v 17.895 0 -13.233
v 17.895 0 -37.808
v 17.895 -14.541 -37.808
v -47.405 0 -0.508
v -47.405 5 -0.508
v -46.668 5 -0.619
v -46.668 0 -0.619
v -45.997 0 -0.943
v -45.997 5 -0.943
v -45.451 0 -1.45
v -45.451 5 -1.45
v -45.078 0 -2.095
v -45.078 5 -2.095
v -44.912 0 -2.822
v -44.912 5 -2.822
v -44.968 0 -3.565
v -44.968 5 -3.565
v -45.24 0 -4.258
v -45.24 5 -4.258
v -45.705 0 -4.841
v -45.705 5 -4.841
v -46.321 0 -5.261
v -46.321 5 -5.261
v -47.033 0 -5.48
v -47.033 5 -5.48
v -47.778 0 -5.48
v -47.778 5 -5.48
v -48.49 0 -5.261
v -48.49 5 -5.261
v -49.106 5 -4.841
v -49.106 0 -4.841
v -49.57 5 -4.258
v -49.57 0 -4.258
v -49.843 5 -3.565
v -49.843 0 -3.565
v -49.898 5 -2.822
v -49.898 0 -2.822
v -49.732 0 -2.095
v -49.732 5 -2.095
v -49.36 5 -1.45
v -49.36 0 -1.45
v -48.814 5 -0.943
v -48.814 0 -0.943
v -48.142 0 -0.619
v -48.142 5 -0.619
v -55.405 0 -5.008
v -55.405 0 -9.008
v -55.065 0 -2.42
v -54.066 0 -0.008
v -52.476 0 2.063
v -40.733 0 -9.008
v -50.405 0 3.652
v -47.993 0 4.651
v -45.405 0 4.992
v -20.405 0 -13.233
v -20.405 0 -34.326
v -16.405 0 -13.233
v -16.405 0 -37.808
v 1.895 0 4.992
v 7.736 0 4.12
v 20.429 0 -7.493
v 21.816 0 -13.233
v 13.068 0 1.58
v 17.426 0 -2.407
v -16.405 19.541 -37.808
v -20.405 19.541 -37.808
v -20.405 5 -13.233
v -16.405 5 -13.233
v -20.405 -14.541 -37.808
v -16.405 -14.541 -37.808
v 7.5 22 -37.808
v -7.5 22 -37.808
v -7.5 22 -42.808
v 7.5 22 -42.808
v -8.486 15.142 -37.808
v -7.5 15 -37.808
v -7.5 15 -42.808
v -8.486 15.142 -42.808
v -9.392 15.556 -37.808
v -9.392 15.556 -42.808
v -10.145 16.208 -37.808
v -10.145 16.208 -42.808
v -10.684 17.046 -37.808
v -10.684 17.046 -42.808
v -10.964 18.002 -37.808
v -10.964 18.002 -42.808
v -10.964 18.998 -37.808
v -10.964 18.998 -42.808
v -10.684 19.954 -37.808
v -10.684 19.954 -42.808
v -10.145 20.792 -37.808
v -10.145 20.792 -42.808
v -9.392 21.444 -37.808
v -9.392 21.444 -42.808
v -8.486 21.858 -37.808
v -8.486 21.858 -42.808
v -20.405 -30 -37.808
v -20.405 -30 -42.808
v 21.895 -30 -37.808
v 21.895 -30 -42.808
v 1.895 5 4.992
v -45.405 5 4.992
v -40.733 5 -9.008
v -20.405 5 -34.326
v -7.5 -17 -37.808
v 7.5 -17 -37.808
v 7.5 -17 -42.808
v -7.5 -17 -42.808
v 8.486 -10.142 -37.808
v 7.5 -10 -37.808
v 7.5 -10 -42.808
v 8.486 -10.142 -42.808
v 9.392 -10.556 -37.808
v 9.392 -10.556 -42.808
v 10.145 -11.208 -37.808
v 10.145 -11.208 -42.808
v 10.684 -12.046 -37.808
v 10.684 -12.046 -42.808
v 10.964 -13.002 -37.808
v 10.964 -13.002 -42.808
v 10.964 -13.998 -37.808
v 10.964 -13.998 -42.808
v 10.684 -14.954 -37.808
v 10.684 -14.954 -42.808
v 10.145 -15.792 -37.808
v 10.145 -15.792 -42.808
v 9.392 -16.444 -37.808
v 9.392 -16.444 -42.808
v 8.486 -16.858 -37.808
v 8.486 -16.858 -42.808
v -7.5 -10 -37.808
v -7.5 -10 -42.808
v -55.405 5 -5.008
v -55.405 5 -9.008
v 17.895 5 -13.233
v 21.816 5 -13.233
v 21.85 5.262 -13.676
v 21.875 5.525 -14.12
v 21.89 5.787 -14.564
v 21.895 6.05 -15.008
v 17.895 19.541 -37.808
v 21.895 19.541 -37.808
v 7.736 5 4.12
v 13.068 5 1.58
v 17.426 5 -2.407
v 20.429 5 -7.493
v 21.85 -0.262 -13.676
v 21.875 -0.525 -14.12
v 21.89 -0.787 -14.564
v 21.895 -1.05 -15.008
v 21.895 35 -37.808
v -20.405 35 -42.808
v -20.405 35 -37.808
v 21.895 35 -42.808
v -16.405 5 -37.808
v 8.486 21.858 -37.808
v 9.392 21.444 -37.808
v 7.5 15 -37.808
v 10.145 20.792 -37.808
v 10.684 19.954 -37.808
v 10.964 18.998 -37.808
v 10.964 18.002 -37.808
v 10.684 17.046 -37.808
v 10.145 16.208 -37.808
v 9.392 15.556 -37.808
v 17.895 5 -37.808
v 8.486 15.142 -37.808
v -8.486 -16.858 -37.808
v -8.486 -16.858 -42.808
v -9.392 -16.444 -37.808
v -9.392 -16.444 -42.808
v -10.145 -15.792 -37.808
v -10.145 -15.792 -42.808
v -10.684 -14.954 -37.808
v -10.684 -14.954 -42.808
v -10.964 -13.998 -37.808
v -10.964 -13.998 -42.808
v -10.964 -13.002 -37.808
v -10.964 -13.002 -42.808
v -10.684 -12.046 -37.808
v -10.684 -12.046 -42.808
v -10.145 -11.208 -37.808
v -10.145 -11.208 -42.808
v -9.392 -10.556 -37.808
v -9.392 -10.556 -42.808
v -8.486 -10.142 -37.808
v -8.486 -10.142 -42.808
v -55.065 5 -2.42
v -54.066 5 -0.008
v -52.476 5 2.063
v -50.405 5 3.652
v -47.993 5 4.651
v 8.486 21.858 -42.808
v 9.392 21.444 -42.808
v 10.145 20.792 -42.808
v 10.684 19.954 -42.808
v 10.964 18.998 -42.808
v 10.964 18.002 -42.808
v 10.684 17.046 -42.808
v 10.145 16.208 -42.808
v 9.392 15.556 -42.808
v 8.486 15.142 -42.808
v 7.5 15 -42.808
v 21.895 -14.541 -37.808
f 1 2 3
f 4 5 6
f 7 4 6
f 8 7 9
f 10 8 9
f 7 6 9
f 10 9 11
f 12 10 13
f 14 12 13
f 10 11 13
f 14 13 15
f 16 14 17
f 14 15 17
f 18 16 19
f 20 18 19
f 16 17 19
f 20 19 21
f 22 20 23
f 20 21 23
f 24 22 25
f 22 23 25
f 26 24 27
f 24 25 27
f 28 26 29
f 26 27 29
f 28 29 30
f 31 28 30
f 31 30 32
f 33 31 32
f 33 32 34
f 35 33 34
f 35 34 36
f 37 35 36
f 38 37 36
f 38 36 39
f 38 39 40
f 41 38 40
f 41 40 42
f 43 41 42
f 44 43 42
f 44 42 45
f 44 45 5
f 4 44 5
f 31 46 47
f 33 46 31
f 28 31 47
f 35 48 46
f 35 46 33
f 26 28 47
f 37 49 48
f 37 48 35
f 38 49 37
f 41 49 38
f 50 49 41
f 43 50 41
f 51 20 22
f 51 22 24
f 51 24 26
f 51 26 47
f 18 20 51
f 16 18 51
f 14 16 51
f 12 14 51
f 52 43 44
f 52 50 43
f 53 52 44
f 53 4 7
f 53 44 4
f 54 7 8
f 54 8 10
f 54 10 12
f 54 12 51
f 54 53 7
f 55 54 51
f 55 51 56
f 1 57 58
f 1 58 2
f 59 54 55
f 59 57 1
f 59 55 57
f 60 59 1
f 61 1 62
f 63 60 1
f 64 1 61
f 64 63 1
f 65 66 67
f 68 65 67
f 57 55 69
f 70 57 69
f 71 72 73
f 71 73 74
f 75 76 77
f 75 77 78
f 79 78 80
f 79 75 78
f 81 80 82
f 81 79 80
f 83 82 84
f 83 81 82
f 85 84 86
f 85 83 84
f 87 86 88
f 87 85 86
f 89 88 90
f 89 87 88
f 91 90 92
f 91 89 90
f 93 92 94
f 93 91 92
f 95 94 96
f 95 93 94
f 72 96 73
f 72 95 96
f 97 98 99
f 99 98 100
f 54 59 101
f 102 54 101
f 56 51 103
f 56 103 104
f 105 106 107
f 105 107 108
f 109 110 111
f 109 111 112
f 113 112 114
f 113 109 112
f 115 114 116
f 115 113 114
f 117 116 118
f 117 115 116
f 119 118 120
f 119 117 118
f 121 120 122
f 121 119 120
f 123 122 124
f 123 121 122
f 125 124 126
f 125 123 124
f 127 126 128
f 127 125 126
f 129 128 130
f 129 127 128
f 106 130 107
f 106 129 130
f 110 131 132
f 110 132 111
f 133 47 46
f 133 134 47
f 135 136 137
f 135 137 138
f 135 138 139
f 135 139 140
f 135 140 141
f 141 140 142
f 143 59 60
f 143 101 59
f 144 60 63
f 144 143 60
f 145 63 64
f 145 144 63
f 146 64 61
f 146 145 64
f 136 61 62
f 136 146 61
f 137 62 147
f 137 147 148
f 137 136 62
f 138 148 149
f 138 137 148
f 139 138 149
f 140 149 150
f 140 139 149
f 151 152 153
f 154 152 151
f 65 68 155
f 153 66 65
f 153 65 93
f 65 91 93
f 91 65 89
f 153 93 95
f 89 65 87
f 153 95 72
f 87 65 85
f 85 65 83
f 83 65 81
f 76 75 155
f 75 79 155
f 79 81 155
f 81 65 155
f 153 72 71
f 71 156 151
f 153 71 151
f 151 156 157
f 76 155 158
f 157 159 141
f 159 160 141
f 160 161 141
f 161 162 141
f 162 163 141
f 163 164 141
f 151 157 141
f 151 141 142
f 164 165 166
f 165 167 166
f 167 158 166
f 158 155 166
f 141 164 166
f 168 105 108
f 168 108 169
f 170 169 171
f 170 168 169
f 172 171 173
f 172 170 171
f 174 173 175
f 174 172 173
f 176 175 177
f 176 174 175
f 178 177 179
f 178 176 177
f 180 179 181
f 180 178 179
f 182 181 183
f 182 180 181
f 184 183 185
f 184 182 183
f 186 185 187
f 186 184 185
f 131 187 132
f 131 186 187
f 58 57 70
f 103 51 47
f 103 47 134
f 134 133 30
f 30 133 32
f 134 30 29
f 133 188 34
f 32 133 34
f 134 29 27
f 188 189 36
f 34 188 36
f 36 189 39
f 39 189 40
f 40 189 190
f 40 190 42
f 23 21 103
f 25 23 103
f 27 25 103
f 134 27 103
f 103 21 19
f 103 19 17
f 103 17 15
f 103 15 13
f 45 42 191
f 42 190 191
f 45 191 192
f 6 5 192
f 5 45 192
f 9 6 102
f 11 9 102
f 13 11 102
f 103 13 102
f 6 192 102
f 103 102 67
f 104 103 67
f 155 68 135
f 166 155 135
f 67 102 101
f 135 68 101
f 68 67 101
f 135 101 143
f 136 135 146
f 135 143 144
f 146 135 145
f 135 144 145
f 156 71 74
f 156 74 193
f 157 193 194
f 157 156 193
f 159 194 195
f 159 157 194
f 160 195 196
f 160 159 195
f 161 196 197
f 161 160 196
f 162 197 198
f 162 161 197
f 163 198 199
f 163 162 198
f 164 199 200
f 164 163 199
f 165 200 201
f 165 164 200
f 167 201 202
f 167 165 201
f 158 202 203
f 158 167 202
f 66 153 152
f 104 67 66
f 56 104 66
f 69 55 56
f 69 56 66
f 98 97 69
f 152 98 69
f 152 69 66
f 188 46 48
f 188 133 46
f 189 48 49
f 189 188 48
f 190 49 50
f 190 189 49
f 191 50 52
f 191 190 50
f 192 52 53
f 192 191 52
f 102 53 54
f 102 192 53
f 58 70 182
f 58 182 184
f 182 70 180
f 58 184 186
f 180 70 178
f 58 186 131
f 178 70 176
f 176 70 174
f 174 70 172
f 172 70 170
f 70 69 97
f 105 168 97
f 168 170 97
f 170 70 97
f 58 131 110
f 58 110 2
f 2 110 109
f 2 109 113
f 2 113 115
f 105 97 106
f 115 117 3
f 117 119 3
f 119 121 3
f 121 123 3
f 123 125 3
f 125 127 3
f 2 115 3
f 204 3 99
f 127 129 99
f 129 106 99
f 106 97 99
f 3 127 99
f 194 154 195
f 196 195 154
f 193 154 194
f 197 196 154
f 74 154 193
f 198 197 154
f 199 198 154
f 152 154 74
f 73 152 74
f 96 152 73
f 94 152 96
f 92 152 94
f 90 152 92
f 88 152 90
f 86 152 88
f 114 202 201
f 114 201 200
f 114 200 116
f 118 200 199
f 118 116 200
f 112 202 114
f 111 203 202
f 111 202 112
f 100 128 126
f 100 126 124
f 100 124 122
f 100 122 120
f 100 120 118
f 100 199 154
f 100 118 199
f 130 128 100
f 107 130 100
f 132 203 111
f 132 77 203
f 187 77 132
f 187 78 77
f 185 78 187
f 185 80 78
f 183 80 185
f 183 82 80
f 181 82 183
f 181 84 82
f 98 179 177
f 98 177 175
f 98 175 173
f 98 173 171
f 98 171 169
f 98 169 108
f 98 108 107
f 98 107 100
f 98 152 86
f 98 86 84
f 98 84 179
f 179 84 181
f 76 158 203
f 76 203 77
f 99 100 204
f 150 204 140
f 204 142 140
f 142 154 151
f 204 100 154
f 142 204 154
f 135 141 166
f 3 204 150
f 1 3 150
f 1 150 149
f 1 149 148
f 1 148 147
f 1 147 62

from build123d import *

# Parameters (mm, degrees)
BOSS_EXTRUDE1_DEPTH      = 5
BOSS_EXTRUDE4_DEPTH      = 30
BOSS_EXTRUDE4_DEPTH_BACK = 35
SKETCH5_W                = 42.3
SKETCH5_H                = 5
CUT_EXTRUDE5_DEPTH       = 10
SKETCH9_W                = 14
SKETCH9_H                = 5
BOSS_EXTRUDE5_DEPTH      = 35
FILLET1_R                = 10
BOSS_EXTRUDE6_DEPTH      = 4
BOSS_EXTRUDE7_DEPTH      = 4
SKETCH12_R               = 2.5
CUT_EXTRUDE6_DEPTH       = 79.277111821
BOSS_EXTRUDE8_DEPTH      = 5
FILLET2_R                = 20


with BuildPart() as part:
    # Sketch1 → Boss-Extrude1 (new body)
    with BuildSketch(Plane(origin=(0, 0, 0), x_dir=(1, 0, 0), z_dir=(0, 1, 0))):
        Polygon((-10.255294708, 42.808405172), (11.744705292, 42.808405172), (21.894705292, 42.808405172), (21.894705292, 3.008405172), (21.894705292, -4.991594828), (-20.405294708, -4.991594828), (-20.405294708, 3.008405172), (-20.405294708, 42.808405172), align=None)
    extrude(amount=BOSS_EXTRUDE1_DEPTH)

    # Sketch5 → Boss-Extrude4 (add, two sides: drawn at the far end of the back side and taken through both)
    with BuildSketch(Plane(origin=(0, 5, 0), x_dir=(1, 0, 0), z_dir=(0, 1, 0)).offset(-BOSS_EXTRUDE4_DEPTH_BACK)):
        with Locations((0.744705292, 40.308405172)):
            Rectangle(SKETCH5_W, SKETCH5_H)
    extrude(amount=BOSS_EXTRUDE4_DEPTH + BOSS_EXTRUDE4_DEPTH_BACK)

    # Sketch8 → Cut-Extrude5 (cut)
    with BuildSketch(Plane.XY.offset(-37.808405172)):
        with BuildLine():
            Line((-7.5, 22), (7.5, 22))
            ThreePointArc((7.5, 22), (11, 18.5), (7.5, 15))
            Line((7.5, 15), (-7.5, 15))
            ThreePointArc((-7.5, 15), (-11, 18.5), (-7.5, 22))
        make_face()
        with BuildLine():
            Line((-7.5, -10), (7.5, -10))
            ThreePointArc((7.5, -10), (11, -13.5), (7.5, -17))
            Line((7.5, -17), (-7.5, -17))
            ThreePointArc((-7.5, -17), (-11, -13.5), (-7.5, -10))
        make_face()
    extrude(amount=-CUT_EXTRUDE5_DEPTH, mode=Mode.SUBTRACT)

    # Sketch9 → Boss-Extrude5 (add)
    with BuildSketch(Plane.ZY.offset(20.405294708)):
        with Locations((-2.008405172, 2.5)):
            Rectangle(SKETCH9_W, SKETCH9_H)
    extrude(amount=BOSS_EXTRUDE5_DEPTH)

    # Fillet1
    fillet1_edges = [part.edges().sort_by_distance(p)[0] for p in [
        (-55.405294708, 2.5, 4.991594828),
    ]]
    fillet(fillet1_edges, radius=FILLET1_R)

    # Sketch10 → Boss-Extrude6 (add)
    with BuildSketch(Plane.ZY.offset(20.405294708)):
        Polygon((-42.808405172, 2.5), (-42.808405172, 22.5), (-9.008405172, 2.5), (-42.808405172, -17.5), align=None)
    extrude(amount=-BOSS_EXTRUDE6_DEPTH)

    # Sketch11 → Boss-Extrude7 (add)
    with BuildSketch(Plane(origin=(21.894705292, 0, 0), x_dir=(0, 0, -1), z_dir=(1, 0, 0))):
        Polygon((37.808405172, 19.541420118), (37.808405172, -14.541420118), (13.233405172, 0), (13.233405172, 5), align=None)
    extrude(amount=-BOSS_EXTRUDE7_DEPTH)

    # Sketch12 → Cut-Extrude6 (cut, through all)
    with BuildSketch(Plane(origin=(0, 5, 0), x_dir=(1, 0, 0), z_dir=(0, 1, 0))):
        with Locations(Location((-47.405294708, 3.008405172, 0), (0, 0, 270))):
            Circle(SKETCH12_R)
    extrude(amount=-CUT_EXTRUDE6_DEPTH, mode=Mode.SUBTRACT)

    # Sketch13 → Boss-Extrude8 (add)
    with BuildSketch(Plane.XZ):
        Polygon((-40.733122826, -9.008405172), (-20.405294708, -34.32558847), (-20.405294708, -9.008405172), align=None)
    extrude(amount=-BOSS_EXTRUDE8_DEPTH)

    # Fillet2
    fillet2_edges = [part.edges().sort_by_distance(p)[0] for p in [
        (21.894705292, 2.5, 4.991594828),
    ]]
    fillet(fillet2_edges, radius=FILLET2_R)


solid = part.part
